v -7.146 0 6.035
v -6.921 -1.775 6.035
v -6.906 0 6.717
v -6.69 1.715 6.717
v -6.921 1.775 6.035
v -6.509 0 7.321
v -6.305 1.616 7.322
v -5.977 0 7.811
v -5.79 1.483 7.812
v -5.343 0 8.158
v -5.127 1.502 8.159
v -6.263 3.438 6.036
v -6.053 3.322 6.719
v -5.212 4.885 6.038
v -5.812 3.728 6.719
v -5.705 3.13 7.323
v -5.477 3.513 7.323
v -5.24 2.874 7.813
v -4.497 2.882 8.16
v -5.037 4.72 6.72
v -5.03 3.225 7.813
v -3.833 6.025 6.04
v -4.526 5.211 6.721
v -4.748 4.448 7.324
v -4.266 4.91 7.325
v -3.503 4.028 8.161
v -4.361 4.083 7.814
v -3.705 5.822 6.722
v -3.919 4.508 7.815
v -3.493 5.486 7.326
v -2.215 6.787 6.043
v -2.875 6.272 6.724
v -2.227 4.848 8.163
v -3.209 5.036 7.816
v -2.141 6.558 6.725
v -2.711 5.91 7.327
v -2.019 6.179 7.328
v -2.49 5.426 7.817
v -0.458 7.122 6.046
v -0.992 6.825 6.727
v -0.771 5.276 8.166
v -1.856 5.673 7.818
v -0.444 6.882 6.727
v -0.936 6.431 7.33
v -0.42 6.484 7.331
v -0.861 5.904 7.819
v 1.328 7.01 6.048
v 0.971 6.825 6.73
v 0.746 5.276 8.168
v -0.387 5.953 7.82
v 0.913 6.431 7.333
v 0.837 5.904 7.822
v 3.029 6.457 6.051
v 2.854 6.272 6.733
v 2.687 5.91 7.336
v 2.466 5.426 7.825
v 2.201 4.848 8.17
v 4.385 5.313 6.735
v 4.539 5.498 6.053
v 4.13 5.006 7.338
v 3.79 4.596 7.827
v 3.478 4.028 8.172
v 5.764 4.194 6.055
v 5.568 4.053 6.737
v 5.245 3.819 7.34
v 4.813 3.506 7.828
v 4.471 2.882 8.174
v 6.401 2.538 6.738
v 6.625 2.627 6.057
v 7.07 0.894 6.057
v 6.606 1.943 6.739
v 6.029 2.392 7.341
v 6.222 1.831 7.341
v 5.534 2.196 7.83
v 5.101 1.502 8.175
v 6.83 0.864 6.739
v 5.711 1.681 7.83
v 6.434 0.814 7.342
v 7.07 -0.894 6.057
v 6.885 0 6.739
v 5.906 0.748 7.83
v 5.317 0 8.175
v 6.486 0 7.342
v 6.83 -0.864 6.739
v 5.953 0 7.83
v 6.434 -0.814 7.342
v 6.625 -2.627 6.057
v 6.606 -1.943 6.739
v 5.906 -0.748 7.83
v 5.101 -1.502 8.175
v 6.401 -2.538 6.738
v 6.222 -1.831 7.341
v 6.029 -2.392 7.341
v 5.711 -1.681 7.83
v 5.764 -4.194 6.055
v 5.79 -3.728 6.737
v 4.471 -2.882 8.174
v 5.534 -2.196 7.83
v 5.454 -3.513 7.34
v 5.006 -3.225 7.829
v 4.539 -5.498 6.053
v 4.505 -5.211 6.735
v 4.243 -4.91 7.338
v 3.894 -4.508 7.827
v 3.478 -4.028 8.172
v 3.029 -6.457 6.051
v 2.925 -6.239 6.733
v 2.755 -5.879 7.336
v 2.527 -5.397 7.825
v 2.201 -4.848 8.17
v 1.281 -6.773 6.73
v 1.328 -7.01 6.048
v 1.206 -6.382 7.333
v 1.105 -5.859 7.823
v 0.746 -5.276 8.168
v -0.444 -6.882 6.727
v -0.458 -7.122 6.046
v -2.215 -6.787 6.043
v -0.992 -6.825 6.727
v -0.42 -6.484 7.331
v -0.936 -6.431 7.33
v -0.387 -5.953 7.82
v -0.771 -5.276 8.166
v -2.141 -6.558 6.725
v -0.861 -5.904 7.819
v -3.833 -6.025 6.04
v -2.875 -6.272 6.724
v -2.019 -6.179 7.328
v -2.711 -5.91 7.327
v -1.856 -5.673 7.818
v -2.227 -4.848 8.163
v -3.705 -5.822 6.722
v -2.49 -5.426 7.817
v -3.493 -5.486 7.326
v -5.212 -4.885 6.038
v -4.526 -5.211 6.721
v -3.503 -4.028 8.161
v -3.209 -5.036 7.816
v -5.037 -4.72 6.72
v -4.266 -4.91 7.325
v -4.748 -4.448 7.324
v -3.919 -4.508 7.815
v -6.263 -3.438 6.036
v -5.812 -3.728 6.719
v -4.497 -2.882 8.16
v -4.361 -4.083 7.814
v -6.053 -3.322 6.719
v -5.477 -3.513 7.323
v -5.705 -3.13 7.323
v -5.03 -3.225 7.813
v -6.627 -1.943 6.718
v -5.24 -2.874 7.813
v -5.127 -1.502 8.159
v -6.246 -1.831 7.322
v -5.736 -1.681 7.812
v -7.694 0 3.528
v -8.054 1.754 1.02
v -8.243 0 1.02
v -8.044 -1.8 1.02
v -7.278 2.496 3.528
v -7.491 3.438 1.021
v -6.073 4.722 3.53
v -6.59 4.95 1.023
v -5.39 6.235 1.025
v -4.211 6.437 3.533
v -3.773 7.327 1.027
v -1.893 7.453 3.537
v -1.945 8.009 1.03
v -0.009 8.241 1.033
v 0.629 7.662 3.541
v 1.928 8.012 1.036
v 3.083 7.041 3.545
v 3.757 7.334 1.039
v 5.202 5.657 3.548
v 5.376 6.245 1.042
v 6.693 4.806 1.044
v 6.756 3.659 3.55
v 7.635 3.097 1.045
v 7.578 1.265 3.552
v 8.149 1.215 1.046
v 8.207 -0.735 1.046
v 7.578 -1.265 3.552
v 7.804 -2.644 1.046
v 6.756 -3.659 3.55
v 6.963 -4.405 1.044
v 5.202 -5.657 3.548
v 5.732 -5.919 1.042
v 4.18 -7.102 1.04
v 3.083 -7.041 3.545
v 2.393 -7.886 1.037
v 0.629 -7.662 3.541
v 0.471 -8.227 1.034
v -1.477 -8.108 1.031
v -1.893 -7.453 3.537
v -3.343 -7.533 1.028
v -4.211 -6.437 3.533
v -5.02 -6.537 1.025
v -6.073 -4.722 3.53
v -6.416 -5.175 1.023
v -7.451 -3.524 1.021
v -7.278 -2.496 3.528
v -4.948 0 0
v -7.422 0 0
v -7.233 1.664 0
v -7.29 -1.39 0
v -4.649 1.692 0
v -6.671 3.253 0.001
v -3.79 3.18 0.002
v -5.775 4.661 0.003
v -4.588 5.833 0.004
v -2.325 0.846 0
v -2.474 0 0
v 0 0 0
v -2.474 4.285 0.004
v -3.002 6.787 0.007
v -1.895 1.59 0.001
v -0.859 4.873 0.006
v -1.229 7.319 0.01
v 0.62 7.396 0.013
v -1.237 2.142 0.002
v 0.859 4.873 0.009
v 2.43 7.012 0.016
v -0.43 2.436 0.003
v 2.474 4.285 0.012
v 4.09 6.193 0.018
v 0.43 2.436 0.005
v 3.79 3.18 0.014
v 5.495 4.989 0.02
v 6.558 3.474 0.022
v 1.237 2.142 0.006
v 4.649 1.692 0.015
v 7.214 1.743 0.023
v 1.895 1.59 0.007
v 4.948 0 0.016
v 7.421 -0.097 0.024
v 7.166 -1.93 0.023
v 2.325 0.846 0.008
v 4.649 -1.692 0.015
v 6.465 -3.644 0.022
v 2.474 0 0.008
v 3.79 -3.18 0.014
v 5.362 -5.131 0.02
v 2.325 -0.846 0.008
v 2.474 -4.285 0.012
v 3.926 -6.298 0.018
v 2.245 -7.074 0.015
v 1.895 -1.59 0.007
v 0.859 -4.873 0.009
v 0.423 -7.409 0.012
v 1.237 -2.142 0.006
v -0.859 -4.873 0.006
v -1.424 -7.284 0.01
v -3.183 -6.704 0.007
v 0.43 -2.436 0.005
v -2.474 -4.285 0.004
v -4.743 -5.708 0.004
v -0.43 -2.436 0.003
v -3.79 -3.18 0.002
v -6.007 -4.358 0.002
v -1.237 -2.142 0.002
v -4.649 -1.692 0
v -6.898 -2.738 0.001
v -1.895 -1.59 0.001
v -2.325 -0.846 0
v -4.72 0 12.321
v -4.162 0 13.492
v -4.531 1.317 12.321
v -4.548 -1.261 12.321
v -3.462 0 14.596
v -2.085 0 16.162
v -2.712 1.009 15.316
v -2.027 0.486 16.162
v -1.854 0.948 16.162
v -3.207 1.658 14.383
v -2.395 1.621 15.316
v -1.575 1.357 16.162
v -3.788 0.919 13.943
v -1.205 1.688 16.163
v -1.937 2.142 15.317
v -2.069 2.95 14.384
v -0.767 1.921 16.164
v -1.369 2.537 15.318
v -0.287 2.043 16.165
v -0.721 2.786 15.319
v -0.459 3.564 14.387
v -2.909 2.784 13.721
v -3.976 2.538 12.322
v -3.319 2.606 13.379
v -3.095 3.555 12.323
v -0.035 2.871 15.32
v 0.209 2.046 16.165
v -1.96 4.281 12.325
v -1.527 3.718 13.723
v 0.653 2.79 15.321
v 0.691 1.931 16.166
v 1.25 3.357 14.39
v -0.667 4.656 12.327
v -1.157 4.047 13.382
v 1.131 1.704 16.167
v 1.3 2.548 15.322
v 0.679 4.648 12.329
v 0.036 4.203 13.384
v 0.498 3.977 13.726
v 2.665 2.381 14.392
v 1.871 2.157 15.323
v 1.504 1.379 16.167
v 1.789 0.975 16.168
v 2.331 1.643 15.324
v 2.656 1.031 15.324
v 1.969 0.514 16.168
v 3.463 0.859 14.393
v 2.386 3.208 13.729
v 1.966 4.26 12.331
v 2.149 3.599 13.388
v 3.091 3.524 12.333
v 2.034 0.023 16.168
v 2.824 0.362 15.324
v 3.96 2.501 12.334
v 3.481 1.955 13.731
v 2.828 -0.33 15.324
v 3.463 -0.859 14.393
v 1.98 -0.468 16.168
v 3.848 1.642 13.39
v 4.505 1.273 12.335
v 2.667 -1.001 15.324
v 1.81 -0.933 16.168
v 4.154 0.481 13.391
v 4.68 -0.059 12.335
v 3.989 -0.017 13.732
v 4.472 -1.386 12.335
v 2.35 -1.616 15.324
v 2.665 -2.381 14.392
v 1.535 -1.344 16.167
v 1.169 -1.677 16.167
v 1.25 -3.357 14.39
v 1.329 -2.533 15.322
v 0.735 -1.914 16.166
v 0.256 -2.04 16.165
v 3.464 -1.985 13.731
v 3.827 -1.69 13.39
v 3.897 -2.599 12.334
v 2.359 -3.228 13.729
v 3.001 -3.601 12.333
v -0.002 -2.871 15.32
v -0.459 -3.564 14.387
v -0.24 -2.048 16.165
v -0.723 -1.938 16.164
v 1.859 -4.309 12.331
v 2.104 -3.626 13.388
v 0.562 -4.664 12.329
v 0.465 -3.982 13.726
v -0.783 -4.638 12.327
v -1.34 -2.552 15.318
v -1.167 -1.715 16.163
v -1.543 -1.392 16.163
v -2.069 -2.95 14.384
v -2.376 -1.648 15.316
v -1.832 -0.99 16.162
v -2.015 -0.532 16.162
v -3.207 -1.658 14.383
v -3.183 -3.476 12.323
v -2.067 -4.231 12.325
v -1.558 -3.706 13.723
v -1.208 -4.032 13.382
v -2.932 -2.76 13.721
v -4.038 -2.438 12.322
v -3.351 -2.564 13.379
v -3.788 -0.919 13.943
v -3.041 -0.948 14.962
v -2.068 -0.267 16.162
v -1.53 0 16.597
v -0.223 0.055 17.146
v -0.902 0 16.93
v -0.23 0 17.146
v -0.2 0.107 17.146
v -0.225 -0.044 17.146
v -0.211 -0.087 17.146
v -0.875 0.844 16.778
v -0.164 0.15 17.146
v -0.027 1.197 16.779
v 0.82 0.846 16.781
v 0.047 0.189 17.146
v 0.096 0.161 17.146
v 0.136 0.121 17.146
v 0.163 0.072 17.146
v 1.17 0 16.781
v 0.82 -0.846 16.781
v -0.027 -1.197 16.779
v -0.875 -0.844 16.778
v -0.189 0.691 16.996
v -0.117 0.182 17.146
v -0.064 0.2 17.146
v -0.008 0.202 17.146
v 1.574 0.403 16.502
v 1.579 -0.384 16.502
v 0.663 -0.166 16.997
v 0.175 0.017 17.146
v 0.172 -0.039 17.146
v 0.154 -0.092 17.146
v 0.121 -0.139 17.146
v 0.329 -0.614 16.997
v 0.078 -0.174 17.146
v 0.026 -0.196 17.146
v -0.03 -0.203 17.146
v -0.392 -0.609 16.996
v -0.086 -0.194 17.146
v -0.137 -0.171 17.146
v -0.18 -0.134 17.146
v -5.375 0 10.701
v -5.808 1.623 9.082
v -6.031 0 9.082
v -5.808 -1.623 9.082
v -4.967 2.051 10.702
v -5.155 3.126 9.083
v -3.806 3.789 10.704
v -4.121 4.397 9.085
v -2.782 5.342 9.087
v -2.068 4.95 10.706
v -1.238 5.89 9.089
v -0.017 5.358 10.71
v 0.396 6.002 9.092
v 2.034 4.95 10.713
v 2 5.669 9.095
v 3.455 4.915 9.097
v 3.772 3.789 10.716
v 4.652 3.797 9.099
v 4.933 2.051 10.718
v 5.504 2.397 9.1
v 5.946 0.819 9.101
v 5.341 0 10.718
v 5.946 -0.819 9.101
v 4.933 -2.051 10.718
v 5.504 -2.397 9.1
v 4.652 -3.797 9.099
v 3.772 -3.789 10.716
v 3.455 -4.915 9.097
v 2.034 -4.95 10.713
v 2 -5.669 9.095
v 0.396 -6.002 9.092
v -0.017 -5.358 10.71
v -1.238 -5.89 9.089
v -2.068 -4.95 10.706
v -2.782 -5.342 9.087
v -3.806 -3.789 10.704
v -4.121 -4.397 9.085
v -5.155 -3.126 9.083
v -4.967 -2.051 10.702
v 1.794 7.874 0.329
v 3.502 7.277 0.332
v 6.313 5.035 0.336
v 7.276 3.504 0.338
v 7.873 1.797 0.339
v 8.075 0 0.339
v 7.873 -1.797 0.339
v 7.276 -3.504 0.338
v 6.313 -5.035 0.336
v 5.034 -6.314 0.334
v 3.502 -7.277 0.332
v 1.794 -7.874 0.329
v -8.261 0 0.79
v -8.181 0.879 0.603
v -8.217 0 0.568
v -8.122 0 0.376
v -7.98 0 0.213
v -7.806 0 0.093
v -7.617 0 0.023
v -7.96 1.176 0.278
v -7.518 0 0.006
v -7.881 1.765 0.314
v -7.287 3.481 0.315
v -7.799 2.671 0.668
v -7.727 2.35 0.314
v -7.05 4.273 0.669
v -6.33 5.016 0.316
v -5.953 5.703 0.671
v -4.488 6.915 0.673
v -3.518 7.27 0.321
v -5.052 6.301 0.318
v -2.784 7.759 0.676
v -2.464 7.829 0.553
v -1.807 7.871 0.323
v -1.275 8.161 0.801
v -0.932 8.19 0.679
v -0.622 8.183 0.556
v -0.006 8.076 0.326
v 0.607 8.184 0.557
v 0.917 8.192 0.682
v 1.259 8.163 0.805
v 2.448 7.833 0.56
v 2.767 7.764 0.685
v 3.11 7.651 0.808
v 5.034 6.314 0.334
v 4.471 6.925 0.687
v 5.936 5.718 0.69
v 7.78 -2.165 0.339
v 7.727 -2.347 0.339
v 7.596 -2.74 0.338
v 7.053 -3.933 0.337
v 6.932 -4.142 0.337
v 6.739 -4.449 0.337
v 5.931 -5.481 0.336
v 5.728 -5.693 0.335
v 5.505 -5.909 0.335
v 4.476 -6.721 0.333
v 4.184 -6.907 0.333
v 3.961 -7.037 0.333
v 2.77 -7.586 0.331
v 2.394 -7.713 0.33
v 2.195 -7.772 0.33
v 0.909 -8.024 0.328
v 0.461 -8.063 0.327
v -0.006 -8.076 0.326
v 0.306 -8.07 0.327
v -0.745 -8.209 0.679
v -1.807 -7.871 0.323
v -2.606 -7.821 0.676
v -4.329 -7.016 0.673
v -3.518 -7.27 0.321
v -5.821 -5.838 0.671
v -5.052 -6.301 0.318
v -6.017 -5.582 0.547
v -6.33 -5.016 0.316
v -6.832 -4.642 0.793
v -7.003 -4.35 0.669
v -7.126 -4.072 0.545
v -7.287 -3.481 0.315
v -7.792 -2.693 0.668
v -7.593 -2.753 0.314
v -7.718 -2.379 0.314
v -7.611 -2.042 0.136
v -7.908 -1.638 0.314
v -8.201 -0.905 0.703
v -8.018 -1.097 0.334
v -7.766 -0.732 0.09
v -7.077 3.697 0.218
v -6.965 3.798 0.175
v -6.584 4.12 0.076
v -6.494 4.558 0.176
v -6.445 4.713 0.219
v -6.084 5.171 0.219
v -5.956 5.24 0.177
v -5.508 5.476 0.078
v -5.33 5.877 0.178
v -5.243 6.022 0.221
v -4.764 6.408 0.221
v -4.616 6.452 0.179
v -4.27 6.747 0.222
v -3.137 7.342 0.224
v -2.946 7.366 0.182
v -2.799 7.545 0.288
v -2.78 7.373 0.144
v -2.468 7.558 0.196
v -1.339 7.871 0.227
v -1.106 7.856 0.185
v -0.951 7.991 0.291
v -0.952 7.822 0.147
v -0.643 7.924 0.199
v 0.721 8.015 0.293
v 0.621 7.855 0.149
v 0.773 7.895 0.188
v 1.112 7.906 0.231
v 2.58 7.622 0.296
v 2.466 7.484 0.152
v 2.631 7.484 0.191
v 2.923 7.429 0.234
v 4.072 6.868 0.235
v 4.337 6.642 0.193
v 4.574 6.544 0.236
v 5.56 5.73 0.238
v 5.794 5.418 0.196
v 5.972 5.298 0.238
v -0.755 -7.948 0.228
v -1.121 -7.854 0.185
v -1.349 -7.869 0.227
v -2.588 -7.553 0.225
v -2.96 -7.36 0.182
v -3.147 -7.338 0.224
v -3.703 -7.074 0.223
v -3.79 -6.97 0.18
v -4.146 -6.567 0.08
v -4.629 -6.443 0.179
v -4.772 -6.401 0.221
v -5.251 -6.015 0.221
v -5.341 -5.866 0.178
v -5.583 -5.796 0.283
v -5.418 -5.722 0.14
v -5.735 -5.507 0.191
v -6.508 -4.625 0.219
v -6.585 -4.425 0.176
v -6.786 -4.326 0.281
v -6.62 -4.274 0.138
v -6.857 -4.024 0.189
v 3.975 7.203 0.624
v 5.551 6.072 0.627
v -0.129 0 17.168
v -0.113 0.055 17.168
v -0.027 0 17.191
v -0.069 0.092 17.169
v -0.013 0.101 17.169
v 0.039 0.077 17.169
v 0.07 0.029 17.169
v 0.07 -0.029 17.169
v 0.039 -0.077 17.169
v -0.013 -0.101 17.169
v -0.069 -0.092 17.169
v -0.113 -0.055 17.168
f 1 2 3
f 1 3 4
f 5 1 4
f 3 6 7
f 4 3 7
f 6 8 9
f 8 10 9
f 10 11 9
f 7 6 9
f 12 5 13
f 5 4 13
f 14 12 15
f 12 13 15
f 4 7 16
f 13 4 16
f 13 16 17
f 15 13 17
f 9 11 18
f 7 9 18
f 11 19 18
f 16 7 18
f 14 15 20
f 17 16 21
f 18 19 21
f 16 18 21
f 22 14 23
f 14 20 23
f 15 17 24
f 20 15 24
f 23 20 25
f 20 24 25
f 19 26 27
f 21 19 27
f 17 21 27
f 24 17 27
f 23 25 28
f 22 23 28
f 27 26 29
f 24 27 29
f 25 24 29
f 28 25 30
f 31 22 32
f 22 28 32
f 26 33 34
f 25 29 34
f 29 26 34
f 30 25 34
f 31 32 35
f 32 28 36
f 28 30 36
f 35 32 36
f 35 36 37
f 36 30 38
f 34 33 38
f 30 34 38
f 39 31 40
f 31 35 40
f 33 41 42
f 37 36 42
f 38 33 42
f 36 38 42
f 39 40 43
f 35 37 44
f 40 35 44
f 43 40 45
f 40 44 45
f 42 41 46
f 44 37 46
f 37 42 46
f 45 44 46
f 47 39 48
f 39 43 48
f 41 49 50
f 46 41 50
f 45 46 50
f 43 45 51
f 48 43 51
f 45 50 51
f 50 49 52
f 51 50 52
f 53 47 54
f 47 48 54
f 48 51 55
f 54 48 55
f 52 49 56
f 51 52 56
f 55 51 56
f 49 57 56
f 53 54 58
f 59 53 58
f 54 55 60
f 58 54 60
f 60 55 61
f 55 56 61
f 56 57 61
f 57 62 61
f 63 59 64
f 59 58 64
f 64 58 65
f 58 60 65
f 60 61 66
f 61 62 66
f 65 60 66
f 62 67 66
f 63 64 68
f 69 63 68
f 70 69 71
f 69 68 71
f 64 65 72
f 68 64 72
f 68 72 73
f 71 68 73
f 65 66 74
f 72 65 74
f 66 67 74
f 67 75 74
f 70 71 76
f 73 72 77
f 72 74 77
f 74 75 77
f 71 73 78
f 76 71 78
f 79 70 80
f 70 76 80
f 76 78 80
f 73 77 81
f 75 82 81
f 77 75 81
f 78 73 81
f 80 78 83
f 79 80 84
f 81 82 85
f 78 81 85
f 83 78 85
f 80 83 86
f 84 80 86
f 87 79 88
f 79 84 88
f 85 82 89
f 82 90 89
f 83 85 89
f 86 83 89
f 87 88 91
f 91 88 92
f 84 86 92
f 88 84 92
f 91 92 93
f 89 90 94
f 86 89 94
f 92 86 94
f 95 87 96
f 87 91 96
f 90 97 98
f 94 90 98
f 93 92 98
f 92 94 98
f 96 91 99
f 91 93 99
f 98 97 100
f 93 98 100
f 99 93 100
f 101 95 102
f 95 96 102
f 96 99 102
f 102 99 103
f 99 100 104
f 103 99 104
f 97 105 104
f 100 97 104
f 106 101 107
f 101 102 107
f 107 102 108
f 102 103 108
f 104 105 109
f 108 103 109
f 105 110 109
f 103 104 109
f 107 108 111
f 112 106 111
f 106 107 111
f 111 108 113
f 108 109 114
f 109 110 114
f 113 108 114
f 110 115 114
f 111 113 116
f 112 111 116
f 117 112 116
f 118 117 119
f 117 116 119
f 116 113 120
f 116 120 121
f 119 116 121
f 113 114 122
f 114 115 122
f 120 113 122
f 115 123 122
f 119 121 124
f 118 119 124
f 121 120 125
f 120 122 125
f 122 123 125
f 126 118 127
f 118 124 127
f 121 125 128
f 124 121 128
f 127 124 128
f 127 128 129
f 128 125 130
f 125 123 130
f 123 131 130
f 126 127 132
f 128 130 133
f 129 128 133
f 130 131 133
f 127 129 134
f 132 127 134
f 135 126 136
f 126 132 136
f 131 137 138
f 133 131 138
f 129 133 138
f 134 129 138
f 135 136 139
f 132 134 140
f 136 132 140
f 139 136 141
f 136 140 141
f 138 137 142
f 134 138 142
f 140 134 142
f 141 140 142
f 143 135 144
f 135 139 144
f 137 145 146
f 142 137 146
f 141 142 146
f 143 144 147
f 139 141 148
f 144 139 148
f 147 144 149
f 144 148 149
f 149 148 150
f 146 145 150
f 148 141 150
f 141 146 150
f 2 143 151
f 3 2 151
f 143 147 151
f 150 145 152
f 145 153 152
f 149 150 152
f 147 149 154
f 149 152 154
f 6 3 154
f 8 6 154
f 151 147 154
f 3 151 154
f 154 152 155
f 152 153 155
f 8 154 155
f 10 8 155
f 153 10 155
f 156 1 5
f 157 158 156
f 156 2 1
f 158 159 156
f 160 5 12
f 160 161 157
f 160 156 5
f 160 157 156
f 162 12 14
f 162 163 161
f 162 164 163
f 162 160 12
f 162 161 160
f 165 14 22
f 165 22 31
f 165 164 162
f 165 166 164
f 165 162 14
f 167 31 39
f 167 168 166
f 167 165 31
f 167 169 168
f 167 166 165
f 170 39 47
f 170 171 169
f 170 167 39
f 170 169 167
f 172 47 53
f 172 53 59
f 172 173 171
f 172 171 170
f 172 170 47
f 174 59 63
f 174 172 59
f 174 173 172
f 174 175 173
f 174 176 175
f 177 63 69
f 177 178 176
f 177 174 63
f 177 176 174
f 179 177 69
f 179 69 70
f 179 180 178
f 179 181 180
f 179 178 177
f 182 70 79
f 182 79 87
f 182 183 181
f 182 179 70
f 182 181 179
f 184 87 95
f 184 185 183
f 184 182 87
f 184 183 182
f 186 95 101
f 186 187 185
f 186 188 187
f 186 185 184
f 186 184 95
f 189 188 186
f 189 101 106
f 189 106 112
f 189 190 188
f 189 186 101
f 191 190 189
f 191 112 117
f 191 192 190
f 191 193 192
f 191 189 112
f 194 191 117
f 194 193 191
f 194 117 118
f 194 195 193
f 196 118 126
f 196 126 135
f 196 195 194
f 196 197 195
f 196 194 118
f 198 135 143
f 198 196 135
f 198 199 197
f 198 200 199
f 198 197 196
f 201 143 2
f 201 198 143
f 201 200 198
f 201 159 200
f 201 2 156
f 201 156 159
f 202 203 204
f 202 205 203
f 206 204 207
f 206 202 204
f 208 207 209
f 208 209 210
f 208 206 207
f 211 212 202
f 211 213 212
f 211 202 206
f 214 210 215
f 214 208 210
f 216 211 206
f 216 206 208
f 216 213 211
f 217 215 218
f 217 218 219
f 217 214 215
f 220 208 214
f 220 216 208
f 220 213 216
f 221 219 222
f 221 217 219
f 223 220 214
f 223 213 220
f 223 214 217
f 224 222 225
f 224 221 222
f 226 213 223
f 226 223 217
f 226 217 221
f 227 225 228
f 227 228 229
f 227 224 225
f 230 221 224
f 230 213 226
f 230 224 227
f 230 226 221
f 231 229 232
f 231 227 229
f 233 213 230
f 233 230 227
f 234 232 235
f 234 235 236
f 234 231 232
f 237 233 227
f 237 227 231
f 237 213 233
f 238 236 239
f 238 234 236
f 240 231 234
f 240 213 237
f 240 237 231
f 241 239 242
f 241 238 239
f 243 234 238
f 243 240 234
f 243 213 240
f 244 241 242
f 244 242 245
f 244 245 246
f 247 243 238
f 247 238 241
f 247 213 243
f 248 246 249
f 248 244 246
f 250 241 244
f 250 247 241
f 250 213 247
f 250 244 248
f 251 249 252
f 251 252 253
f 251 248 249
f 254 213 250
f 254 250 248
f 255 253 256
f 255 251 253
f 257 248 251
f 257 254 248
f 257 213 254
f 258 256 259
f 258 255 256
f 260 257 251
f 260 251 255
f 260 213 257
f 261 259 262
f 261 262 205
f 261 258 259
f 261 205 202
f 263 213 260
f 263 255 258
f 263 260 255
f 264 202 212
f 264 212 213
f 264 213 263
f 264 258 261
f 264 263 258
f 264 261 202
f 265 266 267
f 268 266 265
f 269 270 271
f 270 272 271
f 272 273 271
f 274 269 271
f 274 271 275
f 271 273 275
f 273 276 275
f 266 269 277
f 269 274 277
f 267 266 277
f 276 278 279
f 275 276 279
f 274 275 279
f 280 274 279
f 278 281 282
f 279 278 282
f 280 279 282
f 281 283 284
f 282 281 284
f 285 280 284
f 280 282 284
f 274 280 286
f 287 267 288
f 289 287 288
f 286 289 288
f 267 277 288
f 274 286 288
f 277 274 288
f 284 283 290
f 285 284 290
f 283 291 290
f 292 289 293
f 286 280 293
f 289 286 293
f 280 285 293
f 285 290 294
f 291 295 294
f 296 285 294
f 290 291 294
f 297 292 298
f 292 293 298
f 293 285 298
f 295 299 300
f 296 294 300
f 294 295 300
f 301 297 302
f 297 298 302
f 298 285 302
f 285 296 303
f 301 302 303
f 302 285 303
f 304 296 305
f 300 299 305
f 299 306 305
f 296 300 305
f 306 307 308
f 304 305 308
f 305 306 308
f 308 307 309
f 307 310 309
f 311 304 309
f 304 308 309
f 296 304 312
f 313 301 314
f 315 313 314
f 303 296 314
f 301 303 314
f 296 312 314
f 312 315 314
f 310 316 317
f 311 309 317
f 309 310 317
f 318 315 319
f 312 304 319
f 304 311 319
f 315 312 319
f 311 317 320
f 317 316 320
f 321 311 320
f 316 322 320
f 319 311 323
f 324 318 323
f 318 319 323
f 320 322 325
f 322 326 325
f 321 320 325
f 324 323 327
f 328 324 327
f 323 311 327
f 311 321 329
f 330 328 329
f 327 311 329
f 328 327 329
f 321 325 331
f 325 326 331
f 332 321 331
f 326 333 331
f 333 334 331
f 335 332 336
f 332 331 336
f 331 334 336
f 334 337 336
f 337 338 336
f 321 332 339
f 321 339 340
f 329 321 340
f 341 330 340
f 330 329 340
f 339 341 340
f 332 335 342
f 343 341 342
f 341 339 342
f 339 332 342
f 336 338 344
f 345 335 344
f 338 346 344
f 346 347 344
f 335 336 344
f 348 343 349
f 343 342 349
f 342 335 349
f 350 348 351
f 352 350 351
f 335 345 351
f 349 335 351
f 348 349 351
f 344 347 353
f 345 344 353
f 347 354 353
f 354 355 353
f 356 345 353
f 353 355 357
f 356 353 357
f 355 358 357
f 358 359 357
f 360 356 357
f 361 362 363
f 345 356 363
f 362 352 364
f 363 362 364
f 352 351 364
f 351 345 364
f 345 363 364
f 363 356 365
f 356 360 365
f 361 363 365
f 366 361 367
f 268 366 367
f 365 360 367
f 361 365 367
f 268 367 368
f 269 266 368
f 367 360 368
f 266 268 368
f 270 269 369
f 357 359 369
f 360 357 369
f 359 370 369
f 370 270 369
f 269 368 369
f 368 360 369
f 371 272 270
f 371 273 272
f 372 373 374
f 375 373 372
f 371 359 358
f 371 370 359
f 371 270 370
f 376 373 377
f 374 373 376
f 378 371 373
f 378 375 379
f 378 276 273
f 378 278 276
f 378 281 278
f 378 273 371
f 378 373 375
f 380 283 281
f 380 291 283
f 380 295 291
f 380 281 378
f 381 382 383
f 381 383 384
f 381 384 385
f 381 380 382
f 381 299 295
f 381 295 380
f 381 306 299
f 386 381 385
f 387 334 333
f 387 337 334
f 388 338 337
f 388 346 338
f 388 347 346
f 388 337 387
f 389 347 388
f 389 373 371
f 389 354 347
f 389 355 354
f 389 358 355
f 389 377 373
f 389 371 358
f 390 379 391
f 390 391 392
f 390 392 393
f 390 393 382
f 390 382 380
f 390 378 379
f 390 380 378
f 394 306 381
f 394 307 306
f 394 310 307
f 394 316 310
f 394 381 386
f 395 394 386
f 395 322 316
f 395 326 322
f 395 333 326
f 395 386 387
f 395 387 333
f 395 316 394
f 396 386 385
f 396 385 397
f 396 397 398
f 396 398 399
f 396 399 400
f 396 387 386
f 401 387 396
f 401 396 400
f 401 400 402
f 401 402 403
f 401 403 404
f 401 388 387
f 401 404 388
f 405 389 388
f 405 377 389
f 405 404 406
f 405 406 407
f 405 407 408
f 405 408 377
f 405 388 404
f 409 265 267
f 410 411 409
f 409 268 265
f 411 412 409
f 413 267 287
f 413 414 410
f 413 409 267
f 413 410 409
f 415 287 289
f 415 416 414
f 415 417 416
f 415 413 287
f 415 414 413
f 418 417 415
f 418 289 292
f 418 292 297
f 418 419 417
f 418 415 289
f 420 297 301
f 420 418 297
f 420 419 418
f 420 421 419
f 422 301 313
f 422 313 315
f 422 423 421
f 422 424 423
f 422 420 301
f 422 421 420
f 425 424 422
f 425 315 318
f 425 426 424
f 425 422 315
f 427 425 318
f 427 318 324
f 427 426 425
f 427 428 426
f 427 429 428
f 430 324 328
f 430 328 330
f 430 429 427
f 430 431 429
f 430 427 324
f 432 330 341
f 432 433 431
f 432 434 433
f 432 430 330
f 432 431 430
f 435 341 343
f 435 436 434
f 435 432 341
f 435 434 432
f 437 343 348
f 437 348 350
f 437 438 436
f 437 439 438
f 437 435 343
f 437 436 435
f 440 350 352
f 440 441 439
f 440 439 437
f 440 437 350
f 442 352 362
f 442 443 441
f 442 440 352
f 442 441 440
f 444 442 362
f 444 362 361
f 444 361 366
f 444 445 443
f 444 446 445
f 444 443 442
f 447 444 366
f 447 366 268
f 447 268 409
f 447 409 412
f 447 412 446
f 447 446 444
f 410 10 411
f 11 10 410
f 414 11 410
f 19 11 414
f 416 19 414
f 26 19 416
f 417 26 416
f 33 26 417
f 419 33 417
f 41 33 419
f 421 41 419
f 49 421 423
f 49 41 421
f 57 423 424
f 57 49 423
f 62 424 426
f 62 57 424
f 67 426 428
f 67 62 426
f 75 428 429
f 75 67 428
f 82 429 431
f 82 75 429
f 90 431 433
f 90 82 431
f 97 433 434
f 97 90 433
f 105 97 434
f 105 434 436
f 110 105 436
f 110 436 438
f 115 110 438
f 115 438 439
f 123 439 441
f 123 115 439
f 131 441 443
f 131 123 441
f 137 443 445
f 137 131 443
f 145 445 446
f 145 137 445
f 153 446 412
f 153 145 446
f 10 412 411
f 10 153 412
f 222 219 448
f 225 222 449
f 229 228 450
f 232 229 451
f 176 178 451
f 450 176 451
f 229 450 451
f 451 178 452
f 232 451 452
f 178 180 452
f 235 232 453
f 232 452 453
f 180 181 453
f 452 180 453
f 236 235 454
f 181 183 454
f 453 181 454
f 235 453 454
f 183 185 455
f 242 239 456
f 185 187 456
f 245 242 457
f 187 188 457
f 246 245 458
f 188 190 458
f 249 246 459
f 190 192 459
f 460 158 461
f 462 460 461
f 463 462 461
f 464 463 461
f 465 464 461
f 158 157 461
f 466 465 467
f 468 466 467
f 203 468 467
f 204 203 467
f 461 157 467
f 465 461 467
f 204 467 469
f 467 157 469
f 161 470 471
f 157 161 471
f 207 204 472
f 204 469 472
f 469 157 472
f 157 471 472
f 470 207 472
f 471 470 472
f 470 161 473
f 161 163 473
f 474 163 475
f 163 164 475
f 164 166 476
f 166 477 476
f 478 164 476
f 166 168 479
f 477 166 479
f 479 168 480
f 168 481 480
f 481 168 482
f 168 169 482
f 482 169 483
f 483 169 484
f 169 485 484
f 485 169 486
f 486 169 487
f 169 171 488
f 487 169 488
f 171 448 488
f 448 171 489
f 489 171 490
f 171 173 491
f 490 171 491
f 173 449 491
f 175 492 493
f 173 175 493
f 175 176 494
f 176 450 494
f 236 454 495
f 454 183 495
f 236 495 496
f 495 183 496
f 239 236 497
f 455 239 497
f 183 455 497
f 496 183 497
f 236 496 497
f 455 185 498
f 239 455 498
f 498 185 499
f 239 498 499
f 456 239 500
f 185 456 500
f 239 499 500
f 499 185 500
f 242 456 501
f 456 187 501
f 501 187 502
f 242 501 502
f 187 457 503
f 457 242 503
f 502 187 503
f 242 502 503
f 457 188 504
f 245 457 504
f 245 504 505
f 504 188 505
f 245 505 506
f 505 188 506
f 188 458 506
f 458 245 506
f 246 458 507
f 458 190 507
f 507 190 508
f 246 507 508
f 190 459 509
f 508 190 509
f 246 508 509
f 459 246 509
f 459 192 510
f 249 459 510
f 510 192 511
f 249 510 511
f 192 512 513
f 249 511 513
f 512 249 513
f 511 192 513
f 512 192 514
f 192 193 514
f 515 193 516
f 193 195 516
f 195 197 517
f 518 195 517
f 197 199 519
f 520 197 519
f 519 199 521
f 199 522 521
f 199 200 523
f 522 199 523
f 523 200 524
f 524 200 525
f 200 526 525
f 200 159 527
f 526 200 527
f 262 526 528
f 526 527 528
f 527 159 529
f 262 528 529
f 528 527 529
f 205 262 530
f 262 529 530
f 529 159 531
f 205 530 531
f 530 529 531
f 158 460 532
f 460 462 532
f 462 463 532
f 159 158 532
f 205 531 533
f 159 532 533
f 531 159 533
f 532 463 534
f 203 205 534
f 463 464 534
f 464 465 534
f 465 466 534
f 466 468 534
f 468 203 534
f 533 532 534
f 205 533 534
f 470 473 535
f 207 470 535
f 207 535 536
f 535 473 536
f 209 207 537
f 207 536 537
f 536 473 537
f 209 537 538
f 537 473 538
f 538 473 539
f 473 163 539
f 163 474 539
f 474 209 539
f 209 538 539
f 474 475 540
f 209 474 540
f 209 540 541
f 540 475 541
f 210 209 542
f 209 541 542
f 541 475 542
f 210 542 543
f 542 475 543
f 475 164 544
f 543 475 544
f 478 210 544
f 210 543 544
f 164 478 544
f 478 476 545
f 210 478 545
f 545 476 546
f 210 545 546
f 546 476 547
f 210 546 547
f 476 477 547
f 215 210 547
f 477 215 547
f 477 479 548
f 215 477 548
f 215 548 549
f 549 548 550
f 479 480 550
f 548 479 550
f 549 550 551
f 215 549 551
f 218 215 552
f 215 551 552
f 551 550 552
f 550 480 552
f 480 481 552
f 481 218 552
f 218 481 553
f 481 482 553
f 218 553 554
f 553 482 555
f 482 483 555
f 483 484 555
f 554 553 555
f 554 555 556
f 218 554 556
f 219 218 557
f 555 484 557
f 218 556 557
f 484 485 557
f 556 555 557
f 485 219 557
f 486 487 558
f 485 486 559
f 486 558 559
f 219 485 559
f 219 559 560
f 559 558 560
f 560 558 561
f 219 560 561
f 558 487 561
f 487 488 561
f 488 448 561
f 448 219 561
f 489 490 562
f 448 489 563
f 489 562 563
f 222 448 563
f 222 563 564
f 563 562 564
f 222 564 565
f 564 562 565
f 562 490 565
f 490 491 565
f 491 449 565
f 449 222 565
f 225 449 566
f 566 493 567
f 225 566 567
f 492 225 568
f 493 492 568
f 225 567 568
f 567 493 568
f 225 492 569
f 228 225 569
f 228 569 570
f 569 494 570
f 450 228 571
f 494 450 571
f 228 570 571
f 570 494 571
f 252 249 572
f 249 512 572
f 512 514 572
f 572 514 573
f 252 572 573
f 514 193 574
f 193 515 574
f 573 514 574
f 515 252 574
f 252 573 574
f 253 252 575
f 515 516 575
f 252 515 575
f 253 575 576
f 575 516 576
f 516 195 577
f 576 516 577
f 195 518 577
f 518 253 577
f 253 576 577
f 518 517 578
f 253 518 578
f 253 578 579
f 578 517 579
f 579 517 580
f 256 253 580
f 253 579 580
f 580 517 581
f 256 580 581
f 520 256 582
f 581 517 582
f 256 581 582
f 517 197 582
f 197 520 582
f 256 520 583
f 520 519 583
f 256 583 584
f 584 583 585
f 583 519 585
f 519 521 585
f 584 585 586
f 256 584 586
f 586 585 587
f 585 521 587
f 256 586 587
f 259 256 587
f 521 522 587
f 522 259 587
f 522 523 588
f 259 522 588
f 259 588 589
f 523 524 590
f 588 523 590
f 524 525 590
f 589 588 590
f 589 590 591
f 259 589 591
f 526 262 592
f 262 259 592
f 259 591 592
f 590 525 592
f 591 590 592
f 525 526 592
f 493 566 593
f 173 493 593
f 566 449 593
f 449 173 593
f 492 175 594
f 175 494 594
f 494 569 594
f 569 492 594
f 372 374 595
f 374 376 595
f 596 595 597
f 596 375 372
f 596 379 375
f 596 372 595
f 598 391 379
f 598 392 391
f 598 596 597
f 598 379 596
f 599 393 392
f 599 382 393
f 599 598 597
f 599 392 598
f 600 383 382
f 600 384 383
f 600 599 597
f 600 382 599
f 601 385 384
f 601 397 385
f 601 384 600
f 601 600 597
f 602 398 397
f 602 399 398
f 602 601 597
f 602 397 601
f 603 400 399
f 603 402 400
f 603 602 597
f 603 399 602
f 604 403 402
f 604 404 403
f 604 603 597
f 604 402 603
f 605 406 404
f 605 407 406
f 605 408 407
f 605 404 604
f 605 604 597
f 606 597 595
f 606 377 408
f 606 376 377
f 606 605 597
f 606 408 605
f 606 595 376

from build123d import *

# Parameters (mm, degrees)
F2_R = 10.8349837227
F3_R = 4.004166267
F4_R = 0.840522708


# Not quite as in the source:
# - a fillet or chamfer that OpenCascade refuses, or shapes differently, is made with other operations: its cross-section is extruded or revolved along the edge and cut away or added


with BuildPart() as f1:
    # F0 (on Front) → F1 (revolve)
    with BuildSketch(Plane.XZ):
        Polygon((-8.4658376873, 0), (0, 0), (-0.0272442667, 17.1914175153), (-1.2093468104, 16.9241316617), (-3.7246965803, 14.7794829682), (-6.0306731611, 9.0818414465), (-5.3430483676, 8.1584332511), (-6.7771640606, 7.7190031298), align=None)
    revolve(axis=Axis((-0.0136221333, 0, 8.5957087576), (0.0015847578, 0, -0.9999987443)))

    # F2
    f2_edges = [f1.edges().sort_by_distance(p)[0] for p in [
        (3.677834, 0, 14.791214),
    ]]
    fillet(f2_edges, radius=F2_R)

    # F3
    f3_edges = [f1.edges().sort_by_distance(p)[0] for p in [
        (1.1557, 0, 16.92788),
    ]]
    fillet(f3_edges, radius=F3_R)

    # F4
    f4_edges = [f1.edges().sort_by_distance(p)[0] for p in [
        (8.465795, 0, 0.026833),
    ]]
    fillet(f4_edges, radius=F4_R)

    # F5: fillet of radius 2.9679064036 on 1 edges, made by hand

    # F5_s1 → F5_t2 (revolve, cut)
    with BuildSketch(Plane.XZ):
        with BuildLine():
            ThreePointArc((-7.1455909431, 6.0349072725), (-6.5089088862, 7.3212652789), (-5.3430483676, 8.1584332511))
            Line((-5.3430483676, 8.1584332511), (-6.7771640606, 7.7190031298))
            Line((-6.7771640606, 7.7190031298), (-7.1455909431, 6.0349072725))
        make_face()
    revolve(axis=Axis((-0.0122497554, 0, 7.7297238937), (0.0015847578, 0, -0.9999987443)), mode=Mode.SUBTRACT)


solid = f1.part
